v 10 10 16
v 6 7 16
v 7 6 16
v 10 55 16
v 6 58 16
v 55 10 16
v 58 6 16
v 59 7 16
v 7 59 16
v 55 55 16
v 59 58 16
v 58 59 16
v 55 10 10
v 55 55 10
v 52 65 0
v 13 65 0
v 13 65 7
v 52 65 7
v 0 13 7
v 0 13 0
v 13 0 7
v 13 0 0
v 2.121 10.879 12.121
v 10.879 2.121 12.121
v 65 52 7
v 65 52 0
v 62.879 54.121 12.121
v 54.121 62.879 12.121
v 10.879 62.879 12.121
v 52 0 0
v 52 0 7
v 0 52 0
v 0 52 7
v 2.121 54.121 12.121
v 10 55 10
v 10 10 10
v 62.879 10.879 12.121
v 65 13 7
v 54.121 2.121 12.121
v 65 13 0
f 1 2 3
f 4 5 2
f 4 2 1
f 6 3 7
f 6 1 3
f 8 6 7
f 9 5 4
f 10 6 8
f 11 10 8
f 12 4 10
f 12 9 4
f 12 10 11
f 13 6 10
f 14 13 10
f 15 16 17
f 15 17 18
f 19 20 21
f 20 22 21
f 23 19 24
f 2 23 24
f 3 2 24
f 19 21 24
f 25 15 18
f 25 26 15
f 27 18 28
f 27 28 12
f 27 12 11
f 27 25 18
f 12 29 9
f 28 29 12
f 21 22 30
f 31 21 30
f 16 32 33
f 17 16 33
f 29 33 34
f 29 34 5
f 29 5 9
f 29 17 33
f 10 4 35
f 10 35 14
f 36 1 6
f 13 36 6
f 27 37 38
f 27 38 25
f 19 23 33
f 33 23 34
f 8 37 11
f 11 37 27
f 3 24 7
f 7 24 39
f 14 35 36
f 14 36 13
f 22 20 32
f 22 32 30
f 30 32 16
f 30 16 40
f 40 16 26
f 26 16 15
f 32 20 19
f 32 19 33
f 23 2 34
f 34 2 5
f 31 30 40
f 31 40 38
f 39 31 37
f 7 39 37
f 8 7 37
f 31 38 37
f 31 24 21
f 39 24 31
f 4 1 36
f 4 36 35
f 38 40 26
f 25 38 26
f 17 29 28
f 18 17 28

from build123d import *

# Parameters (mm, degrees)
SKETCH_W        = 65
SKETCH_H        = 65
PAD_DEPTH       = 16
SKETCH001_W     = 45
SKETCH001_H     = 45
POCKET_DEPTH    = 6
CHAMFER_SIZE    = 13
CHAMFER001_SIZE = 6
CHAMFER002_SIZE = 3


with BuildPart() as part:
    # Sketch → Pad (new body)
    with BuildSketch(Plane.XY):
        with Locations((32.5, 32.5)):
            Rectangle(SKETCH_W, SKETCH_H)
    extrude(amount=PAD_DEPTH)

    # Sketch001 (on Face6 of Pad) → Pocket (cut)
    with BuildSketch(Plane.XY.offset(16)):
        with Locations((32.5, 32.5)):
            Rectangle(SKETCH001_W, SKETCH001_H)
    extrude(amount=-POCKET_DEPTH, mode=Mode.SUBTRACT)

    # Chamfer
    chamfer_edges = [part.edges().sort_by_distance(p)[0] for p in [
        (0, 0, 8),
        (65, 0, 8),
        (65, 65, 8),
        (0, 65, 8),
    ]]
    chamfer(chamfer_edges, length=CHAMFER_SIZE)

    # Chamfer001
    chamfer001_edges = [part.edges().sort_by_distance(p)[0] for p in [
        (32.5, 0, 16),
        (65, 32.5, 16),
        (32.5, 65, 16),
        (0, 32.5, 16),
    ]]
    chamfer(chamfer001_edges, length=CHAMFER001_SIZE)

    # Chamfer002
    chamfer002_edges = [part.edges().sort_by_distance(p)[0] for p in [
        (32.5, 0, 10),
        (65, 32.5, 10),
        (32.5, 65, 10),
        (0, 32.5, 10),
    ]]
    chamfer(chamfer002_edges, length=CHAMFER002_SIZE)


solid = part.part
